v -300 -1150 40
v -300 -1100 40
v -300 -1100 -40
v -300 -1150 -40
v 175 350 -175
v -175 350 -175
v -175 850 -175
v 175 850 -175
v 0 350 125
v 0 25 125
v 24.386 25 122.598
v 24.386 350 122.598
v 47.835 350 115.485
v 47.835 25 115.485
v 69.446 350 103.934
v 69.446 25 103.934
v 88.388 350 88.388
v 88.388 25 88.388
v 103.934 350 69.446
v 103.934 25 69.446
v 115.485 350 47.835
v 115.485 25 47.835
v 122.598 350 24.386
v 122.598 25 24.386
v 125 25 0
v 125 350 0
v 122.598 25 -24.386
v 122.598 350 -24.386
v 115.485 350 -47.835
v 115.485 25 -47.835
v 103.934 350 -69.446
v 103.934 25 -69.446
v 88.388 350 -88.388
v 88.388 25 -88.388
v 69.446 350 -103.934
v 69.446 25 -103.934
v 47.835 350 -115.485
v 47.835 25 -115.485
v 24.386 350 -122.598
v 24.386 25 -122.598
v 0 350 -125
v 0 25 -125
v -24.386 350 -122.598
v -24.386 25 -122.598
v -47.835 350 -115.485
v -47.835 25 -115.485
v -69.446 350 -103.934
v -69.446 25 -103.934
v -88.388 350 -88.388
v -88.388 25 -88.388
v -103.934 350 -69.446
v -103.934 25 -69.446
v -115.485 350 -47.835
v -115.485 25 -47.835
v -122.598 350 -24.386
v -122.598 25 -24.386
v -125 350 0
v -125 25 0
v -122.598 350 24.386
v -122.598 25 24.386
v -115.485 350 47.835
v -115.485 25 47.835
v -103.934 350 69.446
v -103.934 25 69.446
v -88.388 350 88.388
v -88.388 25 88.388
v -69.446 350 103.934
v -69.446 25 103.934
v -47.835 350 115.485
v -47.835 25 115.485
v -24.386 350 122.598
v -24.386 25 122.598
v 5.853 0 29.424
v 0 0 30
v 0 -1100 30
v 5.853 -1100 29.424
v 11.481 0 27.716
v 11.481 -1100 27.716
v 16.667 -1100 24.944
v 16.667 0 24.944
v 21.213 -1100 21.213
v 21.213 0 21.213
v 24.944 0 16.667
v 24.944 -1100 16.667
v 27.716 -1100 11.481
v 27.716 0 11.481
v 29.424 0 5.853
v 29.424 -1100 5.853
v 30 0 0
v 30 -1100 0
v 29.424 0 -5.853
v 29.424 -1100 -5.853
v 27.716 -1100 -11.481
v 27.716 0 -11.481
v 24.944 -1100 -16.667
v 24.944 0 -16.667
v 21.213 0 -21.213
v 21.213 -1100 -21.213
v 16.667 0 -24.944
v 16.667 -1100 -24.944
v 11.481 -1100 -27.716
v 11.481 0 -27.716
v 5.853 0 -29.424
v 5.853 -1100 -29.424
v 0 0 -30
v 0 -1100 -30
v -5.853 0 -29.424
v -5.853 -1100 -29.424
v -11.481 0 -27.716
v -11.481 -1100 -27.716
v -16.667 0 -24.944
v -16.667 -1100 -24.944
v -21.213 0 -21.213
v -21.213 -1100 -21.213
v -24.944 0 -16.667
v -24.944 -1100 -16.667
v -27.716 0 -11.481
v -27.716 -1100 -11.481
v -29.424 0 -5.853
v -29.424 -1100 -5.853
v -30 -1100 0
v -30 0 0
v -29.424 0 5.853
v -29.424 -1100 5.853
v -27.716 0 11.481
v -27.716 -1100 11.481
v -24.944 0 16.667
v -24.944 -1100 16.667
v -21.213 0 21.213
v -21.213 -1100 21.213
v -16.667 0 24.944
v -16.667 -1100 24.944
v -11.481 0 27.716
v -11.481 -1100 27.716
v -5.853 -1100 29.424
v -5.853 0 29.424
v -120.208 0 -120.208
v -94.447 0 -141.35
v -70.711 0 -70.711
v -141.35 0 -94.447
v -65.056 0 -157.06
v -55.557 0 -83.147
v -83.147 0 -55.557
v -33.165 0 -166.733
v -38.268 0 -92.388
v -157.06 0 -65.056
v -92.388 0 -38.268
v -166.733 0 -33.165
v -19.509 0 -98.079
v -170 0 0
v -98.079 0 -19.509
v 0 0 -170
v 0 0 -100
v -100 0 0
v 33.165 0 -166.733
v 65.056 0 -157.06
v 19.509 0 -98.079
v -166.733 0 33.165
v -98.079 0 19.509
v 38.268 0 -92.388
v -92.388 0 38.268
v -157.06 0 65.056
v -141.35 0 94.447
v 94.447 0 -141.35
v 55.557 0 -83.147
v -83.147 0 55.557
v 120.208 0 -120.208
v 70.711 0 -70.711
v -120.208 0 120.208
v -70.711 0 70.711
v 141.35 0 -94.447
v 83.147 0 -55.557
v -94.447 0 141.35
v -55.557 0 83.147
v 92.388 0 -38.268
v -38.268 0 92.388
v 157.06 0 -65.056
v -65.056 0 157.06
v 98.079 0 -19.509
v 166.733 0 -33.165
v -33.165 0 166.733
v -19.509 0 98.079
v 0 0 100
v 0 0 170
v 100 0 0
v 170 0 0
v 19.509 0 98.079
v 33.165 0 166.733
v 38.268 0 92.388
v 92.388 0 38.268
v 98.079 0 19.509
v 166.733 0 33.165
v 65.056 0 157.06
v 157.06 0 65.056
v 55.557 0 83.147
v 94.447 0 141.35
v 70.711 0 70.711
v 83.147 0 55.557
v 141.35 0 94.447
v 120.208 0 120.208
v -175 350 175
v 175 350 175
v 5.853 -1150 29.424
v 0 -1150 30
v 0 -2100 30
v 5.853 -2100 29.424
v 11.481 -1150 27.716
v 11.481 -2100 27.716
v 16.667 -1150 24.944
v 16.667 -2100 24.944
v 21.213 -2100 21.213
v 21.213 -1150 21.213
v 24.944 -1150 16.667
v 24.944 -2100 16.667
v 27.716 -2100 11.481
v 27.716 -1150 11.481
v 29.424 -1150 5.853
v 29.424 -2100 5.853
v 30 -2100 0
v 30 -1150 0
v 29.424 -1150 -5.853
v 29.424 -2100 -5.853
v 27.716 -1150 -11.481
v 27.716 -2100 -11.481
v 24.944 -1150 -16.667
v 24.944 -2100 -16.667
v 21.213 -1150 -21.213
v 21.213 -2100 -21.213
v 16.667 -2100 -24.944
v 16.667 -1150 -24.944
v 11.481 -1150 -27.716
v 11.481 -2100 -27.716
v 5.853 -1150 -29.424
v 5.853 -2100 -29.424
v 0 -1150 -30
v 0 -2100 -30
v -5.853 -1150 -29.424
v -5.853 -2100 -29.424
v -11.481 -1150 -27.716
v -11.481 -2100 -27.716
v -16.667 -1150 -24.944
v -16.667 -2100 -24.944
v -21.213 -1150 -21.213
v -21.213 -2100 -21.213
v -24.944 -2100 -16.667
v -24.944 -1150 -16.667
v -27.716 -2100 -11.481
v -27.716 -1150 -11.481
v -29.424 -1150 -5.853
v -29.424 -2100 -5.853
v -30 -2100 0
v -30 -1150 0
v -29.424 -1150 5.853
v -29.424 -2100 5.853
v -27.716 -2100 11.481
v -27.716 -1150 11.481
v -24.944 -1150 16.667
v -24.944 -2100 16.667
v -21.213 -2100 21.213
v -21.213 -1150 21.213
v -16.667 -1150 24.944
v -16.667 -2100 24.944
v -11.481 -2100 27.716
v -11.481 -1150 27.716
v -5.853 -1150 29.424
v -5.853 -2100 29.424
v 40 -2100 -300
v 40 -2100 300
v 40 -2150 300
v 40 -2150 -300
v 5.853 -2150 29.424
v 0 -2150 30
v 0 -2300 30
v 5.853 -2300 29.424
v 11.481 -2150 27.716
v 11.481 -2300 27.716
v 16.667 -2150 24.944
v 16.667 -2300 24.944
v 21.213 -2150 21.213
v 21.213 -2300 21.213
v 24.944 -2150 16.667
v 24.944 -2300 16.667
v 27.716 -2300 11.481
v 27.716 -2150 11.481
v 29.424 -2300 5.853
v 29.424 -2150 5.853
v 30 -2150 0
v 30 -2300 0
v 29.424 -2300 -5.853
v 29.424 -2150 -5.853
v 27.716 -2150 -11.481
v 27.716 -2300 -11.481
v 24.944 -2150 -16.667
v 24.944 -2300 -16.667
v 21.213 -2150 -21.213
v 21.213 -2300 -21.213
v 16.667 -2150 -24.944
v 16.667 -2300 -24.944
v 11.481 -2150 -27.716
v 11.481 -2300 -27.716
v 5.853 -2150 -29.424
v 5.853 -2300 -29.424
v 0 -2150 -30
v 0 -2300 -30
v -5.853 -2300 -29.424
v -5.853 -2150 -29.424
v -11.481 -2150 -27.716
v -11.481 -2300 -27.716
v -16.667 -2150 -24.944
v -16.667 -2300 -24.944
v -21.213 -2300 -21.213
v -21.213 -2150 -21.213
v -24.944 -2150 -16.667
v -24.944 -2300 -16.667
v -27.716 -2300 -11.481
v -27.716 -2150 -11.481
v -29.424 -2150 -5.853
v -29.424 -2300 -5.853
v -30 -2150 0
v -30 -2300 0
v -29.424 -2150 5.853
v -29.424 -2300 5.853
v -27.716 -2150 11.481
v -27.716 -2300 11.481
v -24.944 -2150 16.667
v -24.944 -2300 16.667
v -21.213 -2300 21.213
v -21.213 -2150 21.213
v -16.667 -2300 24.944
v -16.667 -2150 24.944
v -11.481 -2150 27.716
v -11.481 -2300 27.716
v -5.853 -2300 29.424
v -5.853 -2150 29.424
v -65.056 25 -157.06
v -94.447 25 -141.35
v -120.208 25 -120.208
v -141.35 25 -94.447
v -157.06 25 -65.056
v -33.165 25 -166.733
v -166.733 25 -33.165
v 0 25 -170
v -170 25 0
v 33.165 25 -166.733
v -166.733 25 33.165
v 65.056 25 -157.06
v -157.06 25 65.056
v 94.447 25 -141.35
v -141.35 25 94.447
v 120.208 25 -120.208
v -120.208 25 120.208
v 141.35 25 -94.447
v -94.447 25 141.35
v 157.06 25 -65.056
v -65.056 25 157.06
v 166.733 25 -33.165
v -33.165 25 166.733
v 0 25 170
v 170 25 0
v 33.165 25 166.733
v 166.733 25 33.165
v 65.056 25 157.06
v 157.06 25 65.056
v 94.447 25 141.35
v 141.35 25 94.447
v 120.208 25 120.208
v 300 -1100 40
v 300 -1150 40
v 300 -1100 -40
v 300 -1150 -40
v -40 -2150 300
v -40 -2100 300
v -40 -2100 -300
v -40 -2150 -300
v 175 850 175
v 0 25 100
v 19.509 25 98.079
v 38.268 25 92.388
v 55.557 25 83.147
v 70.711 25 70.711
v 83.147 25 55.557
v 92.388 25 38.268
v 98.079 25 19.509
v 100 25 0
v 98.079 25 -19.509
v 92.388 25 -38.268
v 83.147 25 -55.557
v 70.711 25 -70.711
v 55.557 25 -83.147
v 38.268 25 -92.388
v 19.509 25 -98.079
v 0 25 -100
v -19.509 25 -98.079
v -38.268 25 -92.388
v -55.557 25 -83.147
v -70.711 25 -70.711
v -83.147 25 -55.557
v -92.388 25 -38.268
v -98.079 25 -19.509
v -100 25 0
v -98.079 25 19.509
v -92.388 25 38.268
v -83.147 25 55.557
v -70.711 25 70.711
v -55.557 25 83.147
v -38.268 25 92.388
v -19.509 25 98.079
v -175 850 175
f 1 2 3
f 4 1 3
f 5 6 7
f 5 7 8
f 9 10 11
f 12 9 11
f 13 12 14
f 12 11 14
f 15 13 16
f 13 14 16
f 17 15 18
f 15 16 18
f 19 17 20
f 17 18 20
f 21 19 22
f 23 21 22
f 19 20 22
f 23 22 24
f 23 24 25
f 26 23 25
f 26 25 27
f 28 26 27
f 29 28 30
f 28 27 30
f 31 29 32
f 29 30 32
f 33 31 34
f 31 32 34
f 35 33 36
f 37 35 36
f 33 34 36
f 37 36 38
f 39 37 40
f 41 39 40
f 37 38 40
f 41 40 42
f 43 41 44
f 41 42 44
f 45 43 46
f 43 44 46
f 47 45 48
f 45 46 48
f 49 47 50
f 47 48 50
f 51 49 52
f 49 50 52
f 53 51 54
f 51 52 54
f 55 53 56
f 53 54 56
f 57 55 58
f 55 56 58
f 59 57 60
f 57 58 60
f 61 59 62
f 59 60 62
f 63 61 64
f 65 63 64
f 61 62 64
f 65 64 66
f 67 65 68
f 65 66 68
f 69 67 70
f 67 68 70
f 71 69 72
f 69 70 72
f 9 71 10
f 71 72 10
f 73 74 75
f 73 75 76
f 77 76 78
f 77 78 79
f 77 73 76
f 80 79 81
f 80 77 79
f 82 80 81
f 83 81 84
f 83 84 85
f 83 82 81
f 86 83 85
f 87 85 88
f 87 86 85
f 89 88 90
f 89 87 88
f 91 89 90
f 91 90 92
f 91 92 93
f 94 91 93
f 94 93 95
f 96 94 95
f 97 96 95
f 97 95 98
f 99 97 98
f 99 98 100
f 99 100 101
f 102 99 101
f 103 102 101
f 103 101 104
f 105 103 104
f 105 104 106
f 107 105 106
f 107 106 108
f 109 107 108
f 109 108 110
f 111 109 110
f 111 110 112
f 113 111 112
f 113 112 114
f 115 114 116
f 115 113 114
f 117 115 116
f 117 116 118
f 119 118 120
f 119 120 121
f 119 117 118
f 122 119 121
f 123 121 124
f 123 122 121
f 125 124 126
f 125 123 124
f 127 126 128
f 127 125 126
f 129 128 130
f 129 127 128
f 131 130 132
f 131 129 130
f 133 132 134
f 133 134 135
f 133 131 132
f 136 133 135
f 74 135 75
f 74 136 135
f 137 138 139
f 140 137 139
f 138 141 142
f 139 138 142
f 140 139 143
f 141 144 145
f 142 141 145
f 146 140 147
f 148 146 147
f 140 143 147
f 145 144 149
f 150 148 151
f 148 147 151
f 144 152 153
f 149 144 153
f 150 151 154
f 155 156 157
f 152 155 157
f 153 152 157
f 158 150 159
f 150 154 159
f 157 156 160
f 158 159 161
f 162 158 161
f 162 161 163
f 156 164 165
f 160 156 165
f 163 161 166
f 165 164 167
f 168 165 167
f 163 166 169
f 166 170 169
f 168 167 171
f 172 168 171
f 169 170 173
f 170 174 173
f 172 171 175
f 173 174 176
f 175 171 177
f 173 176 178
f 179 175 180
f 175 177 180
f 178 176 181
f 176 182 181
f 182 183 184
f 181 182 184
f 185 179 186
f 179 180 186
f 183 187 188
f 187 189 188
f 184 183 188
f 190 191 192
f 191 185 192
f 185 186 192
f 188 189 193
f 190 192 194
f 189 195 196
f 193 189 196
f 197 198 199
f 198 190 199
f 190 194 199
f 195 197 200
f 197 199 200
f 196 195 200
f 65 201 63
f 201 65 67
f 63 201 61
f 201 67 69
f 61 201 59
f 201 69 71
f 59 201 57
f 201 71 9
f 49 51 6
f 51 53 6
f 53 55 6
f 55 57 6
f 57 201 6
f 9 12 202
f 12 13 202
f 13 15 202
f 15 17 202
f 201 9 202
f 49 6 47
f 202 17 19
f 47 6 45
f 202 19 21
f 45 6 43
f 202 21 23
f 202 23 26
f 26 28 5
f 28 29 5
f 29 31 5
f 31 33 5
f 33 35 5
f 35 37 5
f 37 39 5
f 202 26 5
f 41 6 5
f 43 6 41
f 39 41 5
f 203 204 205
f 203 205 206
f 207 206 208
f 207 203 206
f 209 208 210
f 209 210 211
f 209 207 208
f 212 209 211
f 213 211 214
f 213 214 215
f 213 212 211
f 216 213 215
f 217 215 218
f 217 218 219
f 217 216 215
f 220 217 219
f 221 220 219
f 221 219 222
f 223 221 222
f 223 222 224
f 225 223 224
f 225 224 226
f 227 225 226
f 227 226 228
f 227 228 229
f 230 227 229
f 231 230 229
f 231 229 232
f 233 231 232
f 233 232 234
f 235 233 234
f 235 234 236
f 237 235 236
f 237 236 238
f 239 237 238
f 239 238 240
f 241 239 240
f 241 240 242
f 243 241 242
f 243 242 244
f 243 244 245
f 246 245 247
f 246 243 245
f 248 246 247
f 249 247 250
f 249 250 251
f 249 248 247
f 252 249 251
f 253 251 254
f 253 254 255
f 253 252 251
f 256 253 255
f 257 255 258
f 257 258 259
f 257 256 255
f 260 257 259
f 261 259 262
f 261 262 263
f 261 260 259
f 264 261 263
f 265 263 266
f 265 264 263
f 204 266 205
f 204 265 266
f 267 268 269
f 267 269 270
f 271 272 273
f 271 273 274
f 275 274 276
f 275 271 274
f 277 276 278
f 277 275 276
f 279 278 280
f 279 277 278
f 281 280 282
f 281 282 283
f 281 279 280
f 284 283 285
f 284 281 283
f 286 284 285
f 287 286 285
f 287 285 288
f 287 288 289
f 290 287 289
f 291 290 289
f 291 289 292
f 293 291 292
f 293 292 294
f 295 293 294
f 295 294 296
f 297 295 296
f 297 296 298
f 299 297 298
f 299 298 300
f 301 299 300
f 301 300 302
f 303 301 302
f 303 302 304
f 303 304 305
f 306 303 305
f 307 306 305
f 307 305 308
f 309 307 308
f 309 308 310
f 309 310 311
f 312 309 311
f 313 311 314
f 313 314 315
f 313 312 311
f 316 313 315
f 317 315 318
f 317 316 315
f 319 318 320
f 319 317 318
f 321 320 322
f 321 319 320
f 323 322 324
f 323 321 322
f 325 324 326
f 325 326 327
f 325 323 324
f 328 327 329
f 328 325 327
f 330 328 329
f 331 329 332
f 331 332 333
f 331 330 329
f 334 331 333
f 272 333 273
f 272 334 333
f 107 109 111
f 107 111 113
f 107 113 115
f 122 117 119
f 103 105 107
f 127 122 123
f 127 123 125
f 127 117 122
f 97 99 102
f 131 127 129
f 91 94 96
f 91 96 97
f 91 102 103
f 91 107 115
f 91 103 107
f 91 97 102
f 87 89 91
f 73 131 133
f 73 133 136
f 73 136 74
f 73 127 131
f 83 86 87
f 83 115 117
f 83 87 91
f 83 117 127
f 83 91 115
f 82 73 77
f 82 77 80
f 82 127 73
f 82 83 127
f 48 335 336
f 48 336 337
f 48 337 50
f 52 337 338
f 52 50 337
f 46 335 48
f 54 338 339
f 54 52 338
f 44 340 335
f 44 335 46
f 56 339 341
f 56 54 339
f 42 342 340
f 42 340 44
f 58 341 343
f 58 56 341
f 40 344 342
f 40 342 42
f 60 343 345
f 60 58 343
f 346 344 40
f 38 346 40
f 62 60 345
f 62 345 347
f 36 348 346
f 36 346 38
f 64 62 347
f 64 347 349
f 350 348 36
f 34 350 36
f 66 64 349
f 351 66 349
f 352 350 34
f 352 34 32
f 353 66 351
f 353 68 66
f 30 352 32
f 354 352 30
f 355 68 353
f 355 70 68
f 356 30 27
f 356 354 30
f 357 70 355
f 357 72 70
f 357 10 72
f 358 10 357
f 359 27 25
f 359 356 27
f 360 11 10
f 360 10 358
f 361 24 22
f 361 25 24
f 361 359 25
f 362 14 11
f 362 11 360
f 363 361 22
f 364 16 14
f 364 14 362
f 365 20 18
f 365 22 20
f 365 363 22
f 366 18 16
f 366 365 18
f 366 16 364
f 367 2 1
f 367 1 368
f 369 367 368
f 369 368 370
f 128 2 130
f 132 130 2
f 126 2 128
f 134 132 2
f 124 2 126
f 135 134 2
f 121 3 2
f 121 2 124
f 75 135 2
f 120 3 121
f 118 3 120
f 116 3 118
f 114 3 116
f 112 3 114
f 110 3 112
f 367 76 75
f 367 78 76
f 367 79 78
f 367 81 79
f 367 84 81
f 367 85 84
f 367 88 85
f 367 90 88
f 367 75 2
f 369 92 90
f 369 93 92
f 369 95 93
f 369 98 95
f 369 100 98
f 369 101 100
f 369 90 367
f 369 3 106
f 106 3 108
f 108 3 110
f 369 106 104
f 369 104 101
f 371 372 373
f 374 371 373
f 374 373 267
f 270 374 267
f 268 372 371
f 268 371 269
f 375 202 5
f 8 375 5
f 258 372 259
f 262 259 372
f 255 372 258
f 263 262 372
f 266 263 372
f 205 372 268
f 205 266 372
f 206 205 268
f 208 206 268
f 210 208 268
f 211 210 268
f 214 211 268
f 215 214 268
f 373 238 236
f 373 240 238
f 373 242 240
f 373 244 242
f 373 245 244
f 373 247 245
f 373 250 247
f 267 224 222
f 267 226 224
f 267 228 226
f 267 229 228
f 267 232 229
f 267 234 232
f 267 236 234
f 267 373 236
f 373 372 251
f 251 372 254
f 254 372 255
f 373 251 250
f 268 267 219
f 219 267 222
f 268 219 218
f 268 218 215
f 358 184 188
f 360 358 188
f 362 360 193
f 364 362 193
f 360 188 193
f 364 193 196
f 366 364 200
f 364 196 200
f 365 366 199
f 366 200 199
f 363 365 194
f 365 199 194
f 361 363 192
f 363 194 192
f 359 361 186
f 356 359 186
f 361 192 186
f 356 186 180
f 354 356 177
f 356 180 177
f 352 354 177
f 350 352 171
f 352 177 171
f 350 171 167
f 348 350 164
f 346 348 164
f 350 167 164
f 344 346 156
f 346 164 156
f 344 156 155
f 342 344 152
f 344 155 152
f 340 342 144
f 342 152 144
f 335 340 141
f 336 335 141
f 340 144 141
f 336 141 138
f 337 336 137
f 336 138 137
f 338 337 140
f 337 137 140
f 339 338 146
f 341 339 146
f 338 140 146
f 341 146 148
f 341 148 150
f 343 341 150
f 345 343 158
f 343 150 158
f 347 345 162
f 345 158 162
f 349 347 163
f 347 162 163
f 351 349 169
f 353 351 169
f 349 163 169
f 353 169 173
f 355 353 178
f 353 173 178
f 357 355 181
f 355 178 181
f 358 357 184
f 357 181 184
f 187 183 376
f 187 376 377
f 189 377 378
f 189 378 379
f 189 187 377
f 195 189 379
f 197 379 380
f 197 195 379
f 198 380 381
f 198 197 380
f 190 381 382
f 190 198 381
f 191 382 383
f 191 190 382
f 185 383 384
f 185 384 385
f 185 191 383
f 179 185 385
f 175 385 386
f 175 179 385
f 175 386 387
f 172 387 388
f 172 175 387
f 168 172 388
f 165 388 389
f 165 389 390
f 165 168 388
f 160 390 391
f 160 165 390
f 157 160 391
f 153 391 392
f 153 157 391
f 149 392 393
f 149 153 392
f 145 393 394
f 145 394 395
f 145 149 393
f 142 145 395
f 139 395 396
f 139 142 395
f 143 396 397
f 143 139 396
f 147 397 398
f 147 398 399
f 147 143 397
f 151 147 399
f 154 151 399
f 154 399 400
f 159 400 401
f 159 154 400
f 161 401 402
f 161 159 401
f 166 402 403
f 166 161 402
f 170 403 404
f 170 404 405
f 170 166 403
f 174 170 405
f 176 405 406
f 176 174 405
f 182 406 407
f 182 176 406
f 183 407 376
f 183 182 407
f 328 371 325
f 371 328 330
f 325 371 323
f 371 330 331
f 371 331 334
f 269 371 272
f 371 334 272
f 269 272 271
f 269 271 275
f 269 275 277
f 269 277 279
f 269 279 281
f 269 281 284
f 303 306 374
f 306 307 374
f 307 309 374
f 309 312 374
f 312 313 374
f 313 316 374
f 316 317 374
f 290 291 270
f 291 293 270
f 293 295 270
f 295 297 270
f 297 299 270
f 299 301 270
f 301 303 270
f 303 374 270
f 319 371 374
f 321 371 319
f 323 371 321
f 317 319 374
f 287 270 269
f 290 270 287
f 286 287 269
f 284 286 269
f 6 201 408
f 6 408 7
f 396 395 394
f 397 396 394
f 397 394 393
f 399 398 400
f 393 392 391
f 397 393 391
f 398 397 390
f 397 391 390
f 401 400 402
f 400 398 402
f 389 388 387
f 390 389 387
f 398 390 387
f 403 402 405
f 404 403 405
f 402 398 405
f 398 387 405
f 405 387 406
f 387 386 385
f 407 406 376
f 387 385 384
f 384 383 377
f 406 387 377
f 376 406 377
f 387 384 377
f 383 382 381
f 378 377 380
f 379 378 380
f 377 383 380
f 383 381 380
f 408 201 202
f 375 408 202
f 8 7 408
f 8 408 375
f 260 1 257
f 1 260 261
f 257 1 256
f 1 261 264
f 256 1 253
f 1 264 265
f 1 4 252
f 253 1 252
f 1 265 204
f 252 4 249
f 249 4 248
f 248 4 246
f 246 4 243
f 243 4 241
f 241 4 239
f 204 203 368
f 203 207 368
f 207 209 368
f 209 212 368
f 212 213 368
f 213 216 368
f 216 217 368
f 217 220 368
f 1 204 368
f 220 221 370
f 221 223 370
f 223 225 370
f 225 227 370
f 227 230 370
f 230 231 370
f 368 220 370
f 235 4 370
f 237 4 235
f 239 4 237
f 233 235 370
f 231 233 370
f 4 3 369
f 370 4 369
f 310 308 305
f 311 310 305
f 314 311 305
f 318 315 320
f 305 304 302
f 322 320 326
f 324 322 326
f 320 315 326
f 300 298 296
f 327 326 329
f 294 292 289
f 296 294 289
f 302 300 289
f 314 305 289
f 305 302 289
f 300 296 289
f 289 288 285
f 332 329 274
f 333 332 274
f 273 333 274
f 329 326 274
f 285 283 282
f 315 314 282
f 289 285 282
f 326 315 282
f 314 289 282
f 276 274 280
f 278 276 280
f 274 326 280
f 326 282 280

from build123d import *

# Parameters (mm, degrees)
SKETCH1_R           = 170
SKETCH1_R_2         = 100
BOSS_EXTRUDE1_DEPTH = 25
BOSS_EXTRUDE2_START = 25
SKETCH2_R           = 125
BOSS_EXTRUDE2_DEPTH = 325
BOSS_EXTRUDE3_START = 350
SKETCH3_W           = 350
SKETCH3_H           = 350
BOSS_EXTRUDE3_DEPTH = 500
SKETCH4_R           = 30
BOSS_EXTRUDE4_DEPTH = 2300
BOSS_EXTRUDE5_START = -1100
SKETCH5_W           = 600
SKETCH5_H           = 80
BOSS_EXTRUDE5_DEPTH = 50
BOSS_EXTRUDE6_START = -2100
SKETCH6_W           = 80
SKETCH6_H           = 600
BOSS_EXTRUDE6_DEPTH = 50


with BuildPart() as part:
    # Sketch1 → Boss-Extrude1 (new body)
    with BuildSketch(Plane(origin=(0, 0, 0), x_dir=(1, 0, 0), z_dir=(0, 1, 0))):
        with Locations(Location((0, 0, 0), (0, 0, 270))):
            Circle(SKETCH1_R)
        with Locations(Location((0, 0, 0), (0, 0, 270))):
            Circle(SKETCH1_R_2, mode=Mode.SUBTRACT)
    extrude(amount=BOSS_EXTRUDE1_DEPTH)

    # Sketch2 → Boss-Extrude2 (add)
    with BuildSketch(Plane(origin=(0, 0, 0), x_dir=(1, 0, 0), z_dir=(0, 1, 0)).offset(BOSS_EXTRUDE2_START)):
        with Locations(Location((0, 0, 0), (0, 0, 270))):
            Circle(SKETCH2_R)
    extrude(amount=BOSS_EXTRUDE2_DEPTH)

    # Sketch3 → Boss-Extrude3 (add)
    with BuildSketch(Plane(origin=(0, 0, 0), x_dir=(1, 0, 0), z_dir=(0, 1, 0)).offset(BOSS_EXTRUDE3_START)):
        Rectangle(SKETCH3_W, SKETCH3_H)
    extrude(amount=BOSS_EXTRUDE3_DEPTH)


with BuildPart() as body_2:
    # Sketch4 → Boss-Extrude4 (new body)
    with BuildSketch(Plane(origin=(0, 0, 0), x_dir=(1, 0, 0), z_dir=(0, 1, 0))):
        with Locations(Location((0, 0, 0), (0, 0, 270))):
            Circle(SKETCH4_R)
    extrude(amount=-BOSS_EXTRUDE4_DEPTH)

    # Sketch5 → Boss-Extrude5 (add)
    with BuildSketch(Plane(origin=(0, 0, 0), x_dir=(1, 0, 0), z_dir=(0, 1, 0)).offset(BOSS_EXTRUDE5_START)):
        Rectangle(SKETCH5_W, SKETCH5_H)
    extrude(amount=-BOSS_EXTRUDE5_DEPTH)

    # Sketch6 → Boss-Extrude6 (add)
    with BuildSketch(Plane(origin=(0, 0, 0), x_dir=(1, 0, 0), z_dir=(0, 1, 0)).offset(BOSS_EXTRUDE6_START)):
        Rectangle(SKETCH6_W, SKETCH6_H)
    extrude(amount=-BOSS_EXTRUDE6_DEPTH)


solid = Compound([part.part, body_2.part])
